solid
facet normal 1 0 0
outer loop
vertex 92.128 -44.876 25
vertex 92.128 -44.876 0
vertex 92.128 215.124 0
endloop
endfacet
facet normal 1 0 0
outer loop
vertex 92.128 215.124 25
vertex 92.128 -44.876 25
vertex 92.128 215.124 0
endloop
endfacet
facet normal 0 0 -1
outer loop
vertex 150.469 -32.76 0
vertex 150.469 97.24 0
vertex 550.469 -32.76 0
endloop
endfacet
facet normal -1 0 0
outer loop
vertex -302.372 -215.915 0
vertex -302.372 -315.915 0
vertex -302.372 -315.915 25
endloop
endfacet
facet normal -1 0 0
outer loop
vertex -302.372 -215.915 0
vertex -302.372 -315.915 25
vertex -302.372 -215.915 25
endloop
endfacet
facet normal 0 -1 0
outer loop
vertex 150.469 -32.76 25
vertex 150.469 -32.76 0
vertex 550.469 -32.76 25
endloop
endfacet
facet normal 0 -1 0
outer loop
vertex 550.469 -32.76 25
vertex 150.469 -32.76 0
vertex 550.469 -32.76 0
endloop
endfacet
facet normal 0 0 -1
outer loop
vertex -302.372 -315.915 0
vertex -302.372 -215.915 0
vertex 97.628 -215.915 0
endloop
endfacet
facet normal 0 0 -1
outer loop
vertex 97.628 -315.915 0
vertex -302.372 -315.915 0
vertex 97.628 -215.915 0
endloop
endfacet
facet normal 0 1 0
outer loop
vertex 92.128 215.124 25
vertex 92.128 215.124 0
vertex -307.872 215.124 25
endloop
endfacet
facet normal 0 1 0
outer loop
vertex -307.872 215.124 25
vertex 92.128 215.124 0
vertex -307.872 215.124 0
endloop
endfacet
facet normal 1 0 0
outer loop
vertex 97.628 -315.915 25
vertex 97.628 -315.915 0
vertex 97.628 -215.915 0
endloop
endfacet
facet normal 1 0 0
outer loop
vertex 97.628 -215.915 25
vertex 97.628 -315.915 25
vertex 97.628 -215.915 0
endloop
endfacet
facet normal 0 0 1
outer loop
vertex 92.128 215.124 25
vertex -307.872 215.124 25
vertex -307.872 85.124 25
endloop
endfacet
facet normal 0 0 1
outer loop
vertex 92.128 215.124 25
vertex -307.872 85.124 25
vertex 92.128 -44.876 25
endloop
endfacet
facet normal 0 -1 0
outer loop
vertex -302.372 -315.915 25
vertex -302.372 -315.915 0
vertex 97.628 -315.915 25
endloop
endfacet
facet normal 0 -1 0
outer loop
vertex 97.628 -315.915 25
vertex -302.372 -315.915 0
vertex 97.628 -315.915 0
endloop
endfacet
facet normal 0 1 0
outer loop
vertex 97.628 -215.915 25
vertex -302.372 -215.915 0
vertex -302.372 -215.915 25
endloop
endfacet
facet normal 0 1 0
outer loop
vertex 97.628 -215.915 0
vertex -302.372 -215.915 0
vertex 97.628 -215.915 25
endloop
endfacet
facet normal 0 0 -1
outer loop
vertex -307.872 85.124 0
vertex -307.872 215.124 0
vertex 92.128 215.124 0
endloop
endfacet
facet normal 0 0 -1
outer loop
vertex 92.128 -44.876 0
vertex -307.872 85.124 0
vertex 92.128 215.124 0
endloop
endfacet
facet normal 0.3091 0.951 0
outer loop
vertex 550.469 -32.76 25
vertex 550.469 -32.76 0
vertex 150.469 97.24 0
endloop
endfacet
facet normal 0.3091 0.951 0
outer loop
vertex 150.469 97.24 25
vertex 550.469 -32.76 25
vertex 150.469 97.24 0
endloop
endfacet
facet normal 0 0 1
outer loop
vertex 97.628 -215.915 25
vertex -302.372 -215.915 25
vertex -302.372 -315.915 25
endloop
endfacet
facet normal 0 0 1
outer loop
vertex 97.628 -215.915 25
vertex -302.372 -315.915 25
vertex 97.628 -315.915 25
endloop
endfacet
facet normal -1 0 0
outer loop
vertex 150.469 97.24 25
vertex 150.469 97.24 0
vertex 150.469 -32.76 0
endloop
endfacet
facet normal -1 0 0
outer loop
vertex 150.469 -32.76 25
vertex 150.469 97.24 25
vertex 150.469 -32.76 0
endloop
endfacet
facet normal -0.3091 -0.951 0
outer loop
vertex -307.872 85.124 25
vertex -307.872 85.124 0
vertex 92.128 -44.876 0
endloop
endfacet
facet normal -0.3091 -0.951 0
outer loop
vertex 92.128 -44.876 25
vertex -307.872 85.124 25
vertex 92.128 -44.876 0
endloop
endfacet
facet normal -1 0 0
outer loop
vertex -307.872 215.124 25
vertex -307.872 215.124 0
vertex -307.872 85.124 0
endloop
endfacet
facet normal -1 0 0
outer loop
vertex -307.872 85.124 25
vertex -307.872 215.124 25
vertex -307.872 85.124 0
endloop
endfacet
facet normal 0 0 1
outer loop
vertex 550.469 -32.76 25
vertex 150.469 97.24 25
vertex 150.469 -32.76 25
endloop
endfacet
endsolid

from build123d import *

# Parameters (mm, degrees)
F0_W     = 400
F0_H     = 100
F1_DEPTH = 25


with BuildPart() as f1:
    # F0 (on Top) → F1 (new body)
    with BuildSketch(Plane.XY):
        with Locations((-102.372136, -265.915458)):
            Rectangle(F0_W, F0_H)
        Polygon((92.12827, 215.124331), (-307.87173, 215.124331), (-307.87173, 85.124331), (92.12827, -44.875669), align=None)
        Polygon((150.468599, 97.239818), (150.468599, -32.760182), (550.468599, -32.760182), align=None)
    extrude(amount=F1_DEPTH)


solid = f1.part
